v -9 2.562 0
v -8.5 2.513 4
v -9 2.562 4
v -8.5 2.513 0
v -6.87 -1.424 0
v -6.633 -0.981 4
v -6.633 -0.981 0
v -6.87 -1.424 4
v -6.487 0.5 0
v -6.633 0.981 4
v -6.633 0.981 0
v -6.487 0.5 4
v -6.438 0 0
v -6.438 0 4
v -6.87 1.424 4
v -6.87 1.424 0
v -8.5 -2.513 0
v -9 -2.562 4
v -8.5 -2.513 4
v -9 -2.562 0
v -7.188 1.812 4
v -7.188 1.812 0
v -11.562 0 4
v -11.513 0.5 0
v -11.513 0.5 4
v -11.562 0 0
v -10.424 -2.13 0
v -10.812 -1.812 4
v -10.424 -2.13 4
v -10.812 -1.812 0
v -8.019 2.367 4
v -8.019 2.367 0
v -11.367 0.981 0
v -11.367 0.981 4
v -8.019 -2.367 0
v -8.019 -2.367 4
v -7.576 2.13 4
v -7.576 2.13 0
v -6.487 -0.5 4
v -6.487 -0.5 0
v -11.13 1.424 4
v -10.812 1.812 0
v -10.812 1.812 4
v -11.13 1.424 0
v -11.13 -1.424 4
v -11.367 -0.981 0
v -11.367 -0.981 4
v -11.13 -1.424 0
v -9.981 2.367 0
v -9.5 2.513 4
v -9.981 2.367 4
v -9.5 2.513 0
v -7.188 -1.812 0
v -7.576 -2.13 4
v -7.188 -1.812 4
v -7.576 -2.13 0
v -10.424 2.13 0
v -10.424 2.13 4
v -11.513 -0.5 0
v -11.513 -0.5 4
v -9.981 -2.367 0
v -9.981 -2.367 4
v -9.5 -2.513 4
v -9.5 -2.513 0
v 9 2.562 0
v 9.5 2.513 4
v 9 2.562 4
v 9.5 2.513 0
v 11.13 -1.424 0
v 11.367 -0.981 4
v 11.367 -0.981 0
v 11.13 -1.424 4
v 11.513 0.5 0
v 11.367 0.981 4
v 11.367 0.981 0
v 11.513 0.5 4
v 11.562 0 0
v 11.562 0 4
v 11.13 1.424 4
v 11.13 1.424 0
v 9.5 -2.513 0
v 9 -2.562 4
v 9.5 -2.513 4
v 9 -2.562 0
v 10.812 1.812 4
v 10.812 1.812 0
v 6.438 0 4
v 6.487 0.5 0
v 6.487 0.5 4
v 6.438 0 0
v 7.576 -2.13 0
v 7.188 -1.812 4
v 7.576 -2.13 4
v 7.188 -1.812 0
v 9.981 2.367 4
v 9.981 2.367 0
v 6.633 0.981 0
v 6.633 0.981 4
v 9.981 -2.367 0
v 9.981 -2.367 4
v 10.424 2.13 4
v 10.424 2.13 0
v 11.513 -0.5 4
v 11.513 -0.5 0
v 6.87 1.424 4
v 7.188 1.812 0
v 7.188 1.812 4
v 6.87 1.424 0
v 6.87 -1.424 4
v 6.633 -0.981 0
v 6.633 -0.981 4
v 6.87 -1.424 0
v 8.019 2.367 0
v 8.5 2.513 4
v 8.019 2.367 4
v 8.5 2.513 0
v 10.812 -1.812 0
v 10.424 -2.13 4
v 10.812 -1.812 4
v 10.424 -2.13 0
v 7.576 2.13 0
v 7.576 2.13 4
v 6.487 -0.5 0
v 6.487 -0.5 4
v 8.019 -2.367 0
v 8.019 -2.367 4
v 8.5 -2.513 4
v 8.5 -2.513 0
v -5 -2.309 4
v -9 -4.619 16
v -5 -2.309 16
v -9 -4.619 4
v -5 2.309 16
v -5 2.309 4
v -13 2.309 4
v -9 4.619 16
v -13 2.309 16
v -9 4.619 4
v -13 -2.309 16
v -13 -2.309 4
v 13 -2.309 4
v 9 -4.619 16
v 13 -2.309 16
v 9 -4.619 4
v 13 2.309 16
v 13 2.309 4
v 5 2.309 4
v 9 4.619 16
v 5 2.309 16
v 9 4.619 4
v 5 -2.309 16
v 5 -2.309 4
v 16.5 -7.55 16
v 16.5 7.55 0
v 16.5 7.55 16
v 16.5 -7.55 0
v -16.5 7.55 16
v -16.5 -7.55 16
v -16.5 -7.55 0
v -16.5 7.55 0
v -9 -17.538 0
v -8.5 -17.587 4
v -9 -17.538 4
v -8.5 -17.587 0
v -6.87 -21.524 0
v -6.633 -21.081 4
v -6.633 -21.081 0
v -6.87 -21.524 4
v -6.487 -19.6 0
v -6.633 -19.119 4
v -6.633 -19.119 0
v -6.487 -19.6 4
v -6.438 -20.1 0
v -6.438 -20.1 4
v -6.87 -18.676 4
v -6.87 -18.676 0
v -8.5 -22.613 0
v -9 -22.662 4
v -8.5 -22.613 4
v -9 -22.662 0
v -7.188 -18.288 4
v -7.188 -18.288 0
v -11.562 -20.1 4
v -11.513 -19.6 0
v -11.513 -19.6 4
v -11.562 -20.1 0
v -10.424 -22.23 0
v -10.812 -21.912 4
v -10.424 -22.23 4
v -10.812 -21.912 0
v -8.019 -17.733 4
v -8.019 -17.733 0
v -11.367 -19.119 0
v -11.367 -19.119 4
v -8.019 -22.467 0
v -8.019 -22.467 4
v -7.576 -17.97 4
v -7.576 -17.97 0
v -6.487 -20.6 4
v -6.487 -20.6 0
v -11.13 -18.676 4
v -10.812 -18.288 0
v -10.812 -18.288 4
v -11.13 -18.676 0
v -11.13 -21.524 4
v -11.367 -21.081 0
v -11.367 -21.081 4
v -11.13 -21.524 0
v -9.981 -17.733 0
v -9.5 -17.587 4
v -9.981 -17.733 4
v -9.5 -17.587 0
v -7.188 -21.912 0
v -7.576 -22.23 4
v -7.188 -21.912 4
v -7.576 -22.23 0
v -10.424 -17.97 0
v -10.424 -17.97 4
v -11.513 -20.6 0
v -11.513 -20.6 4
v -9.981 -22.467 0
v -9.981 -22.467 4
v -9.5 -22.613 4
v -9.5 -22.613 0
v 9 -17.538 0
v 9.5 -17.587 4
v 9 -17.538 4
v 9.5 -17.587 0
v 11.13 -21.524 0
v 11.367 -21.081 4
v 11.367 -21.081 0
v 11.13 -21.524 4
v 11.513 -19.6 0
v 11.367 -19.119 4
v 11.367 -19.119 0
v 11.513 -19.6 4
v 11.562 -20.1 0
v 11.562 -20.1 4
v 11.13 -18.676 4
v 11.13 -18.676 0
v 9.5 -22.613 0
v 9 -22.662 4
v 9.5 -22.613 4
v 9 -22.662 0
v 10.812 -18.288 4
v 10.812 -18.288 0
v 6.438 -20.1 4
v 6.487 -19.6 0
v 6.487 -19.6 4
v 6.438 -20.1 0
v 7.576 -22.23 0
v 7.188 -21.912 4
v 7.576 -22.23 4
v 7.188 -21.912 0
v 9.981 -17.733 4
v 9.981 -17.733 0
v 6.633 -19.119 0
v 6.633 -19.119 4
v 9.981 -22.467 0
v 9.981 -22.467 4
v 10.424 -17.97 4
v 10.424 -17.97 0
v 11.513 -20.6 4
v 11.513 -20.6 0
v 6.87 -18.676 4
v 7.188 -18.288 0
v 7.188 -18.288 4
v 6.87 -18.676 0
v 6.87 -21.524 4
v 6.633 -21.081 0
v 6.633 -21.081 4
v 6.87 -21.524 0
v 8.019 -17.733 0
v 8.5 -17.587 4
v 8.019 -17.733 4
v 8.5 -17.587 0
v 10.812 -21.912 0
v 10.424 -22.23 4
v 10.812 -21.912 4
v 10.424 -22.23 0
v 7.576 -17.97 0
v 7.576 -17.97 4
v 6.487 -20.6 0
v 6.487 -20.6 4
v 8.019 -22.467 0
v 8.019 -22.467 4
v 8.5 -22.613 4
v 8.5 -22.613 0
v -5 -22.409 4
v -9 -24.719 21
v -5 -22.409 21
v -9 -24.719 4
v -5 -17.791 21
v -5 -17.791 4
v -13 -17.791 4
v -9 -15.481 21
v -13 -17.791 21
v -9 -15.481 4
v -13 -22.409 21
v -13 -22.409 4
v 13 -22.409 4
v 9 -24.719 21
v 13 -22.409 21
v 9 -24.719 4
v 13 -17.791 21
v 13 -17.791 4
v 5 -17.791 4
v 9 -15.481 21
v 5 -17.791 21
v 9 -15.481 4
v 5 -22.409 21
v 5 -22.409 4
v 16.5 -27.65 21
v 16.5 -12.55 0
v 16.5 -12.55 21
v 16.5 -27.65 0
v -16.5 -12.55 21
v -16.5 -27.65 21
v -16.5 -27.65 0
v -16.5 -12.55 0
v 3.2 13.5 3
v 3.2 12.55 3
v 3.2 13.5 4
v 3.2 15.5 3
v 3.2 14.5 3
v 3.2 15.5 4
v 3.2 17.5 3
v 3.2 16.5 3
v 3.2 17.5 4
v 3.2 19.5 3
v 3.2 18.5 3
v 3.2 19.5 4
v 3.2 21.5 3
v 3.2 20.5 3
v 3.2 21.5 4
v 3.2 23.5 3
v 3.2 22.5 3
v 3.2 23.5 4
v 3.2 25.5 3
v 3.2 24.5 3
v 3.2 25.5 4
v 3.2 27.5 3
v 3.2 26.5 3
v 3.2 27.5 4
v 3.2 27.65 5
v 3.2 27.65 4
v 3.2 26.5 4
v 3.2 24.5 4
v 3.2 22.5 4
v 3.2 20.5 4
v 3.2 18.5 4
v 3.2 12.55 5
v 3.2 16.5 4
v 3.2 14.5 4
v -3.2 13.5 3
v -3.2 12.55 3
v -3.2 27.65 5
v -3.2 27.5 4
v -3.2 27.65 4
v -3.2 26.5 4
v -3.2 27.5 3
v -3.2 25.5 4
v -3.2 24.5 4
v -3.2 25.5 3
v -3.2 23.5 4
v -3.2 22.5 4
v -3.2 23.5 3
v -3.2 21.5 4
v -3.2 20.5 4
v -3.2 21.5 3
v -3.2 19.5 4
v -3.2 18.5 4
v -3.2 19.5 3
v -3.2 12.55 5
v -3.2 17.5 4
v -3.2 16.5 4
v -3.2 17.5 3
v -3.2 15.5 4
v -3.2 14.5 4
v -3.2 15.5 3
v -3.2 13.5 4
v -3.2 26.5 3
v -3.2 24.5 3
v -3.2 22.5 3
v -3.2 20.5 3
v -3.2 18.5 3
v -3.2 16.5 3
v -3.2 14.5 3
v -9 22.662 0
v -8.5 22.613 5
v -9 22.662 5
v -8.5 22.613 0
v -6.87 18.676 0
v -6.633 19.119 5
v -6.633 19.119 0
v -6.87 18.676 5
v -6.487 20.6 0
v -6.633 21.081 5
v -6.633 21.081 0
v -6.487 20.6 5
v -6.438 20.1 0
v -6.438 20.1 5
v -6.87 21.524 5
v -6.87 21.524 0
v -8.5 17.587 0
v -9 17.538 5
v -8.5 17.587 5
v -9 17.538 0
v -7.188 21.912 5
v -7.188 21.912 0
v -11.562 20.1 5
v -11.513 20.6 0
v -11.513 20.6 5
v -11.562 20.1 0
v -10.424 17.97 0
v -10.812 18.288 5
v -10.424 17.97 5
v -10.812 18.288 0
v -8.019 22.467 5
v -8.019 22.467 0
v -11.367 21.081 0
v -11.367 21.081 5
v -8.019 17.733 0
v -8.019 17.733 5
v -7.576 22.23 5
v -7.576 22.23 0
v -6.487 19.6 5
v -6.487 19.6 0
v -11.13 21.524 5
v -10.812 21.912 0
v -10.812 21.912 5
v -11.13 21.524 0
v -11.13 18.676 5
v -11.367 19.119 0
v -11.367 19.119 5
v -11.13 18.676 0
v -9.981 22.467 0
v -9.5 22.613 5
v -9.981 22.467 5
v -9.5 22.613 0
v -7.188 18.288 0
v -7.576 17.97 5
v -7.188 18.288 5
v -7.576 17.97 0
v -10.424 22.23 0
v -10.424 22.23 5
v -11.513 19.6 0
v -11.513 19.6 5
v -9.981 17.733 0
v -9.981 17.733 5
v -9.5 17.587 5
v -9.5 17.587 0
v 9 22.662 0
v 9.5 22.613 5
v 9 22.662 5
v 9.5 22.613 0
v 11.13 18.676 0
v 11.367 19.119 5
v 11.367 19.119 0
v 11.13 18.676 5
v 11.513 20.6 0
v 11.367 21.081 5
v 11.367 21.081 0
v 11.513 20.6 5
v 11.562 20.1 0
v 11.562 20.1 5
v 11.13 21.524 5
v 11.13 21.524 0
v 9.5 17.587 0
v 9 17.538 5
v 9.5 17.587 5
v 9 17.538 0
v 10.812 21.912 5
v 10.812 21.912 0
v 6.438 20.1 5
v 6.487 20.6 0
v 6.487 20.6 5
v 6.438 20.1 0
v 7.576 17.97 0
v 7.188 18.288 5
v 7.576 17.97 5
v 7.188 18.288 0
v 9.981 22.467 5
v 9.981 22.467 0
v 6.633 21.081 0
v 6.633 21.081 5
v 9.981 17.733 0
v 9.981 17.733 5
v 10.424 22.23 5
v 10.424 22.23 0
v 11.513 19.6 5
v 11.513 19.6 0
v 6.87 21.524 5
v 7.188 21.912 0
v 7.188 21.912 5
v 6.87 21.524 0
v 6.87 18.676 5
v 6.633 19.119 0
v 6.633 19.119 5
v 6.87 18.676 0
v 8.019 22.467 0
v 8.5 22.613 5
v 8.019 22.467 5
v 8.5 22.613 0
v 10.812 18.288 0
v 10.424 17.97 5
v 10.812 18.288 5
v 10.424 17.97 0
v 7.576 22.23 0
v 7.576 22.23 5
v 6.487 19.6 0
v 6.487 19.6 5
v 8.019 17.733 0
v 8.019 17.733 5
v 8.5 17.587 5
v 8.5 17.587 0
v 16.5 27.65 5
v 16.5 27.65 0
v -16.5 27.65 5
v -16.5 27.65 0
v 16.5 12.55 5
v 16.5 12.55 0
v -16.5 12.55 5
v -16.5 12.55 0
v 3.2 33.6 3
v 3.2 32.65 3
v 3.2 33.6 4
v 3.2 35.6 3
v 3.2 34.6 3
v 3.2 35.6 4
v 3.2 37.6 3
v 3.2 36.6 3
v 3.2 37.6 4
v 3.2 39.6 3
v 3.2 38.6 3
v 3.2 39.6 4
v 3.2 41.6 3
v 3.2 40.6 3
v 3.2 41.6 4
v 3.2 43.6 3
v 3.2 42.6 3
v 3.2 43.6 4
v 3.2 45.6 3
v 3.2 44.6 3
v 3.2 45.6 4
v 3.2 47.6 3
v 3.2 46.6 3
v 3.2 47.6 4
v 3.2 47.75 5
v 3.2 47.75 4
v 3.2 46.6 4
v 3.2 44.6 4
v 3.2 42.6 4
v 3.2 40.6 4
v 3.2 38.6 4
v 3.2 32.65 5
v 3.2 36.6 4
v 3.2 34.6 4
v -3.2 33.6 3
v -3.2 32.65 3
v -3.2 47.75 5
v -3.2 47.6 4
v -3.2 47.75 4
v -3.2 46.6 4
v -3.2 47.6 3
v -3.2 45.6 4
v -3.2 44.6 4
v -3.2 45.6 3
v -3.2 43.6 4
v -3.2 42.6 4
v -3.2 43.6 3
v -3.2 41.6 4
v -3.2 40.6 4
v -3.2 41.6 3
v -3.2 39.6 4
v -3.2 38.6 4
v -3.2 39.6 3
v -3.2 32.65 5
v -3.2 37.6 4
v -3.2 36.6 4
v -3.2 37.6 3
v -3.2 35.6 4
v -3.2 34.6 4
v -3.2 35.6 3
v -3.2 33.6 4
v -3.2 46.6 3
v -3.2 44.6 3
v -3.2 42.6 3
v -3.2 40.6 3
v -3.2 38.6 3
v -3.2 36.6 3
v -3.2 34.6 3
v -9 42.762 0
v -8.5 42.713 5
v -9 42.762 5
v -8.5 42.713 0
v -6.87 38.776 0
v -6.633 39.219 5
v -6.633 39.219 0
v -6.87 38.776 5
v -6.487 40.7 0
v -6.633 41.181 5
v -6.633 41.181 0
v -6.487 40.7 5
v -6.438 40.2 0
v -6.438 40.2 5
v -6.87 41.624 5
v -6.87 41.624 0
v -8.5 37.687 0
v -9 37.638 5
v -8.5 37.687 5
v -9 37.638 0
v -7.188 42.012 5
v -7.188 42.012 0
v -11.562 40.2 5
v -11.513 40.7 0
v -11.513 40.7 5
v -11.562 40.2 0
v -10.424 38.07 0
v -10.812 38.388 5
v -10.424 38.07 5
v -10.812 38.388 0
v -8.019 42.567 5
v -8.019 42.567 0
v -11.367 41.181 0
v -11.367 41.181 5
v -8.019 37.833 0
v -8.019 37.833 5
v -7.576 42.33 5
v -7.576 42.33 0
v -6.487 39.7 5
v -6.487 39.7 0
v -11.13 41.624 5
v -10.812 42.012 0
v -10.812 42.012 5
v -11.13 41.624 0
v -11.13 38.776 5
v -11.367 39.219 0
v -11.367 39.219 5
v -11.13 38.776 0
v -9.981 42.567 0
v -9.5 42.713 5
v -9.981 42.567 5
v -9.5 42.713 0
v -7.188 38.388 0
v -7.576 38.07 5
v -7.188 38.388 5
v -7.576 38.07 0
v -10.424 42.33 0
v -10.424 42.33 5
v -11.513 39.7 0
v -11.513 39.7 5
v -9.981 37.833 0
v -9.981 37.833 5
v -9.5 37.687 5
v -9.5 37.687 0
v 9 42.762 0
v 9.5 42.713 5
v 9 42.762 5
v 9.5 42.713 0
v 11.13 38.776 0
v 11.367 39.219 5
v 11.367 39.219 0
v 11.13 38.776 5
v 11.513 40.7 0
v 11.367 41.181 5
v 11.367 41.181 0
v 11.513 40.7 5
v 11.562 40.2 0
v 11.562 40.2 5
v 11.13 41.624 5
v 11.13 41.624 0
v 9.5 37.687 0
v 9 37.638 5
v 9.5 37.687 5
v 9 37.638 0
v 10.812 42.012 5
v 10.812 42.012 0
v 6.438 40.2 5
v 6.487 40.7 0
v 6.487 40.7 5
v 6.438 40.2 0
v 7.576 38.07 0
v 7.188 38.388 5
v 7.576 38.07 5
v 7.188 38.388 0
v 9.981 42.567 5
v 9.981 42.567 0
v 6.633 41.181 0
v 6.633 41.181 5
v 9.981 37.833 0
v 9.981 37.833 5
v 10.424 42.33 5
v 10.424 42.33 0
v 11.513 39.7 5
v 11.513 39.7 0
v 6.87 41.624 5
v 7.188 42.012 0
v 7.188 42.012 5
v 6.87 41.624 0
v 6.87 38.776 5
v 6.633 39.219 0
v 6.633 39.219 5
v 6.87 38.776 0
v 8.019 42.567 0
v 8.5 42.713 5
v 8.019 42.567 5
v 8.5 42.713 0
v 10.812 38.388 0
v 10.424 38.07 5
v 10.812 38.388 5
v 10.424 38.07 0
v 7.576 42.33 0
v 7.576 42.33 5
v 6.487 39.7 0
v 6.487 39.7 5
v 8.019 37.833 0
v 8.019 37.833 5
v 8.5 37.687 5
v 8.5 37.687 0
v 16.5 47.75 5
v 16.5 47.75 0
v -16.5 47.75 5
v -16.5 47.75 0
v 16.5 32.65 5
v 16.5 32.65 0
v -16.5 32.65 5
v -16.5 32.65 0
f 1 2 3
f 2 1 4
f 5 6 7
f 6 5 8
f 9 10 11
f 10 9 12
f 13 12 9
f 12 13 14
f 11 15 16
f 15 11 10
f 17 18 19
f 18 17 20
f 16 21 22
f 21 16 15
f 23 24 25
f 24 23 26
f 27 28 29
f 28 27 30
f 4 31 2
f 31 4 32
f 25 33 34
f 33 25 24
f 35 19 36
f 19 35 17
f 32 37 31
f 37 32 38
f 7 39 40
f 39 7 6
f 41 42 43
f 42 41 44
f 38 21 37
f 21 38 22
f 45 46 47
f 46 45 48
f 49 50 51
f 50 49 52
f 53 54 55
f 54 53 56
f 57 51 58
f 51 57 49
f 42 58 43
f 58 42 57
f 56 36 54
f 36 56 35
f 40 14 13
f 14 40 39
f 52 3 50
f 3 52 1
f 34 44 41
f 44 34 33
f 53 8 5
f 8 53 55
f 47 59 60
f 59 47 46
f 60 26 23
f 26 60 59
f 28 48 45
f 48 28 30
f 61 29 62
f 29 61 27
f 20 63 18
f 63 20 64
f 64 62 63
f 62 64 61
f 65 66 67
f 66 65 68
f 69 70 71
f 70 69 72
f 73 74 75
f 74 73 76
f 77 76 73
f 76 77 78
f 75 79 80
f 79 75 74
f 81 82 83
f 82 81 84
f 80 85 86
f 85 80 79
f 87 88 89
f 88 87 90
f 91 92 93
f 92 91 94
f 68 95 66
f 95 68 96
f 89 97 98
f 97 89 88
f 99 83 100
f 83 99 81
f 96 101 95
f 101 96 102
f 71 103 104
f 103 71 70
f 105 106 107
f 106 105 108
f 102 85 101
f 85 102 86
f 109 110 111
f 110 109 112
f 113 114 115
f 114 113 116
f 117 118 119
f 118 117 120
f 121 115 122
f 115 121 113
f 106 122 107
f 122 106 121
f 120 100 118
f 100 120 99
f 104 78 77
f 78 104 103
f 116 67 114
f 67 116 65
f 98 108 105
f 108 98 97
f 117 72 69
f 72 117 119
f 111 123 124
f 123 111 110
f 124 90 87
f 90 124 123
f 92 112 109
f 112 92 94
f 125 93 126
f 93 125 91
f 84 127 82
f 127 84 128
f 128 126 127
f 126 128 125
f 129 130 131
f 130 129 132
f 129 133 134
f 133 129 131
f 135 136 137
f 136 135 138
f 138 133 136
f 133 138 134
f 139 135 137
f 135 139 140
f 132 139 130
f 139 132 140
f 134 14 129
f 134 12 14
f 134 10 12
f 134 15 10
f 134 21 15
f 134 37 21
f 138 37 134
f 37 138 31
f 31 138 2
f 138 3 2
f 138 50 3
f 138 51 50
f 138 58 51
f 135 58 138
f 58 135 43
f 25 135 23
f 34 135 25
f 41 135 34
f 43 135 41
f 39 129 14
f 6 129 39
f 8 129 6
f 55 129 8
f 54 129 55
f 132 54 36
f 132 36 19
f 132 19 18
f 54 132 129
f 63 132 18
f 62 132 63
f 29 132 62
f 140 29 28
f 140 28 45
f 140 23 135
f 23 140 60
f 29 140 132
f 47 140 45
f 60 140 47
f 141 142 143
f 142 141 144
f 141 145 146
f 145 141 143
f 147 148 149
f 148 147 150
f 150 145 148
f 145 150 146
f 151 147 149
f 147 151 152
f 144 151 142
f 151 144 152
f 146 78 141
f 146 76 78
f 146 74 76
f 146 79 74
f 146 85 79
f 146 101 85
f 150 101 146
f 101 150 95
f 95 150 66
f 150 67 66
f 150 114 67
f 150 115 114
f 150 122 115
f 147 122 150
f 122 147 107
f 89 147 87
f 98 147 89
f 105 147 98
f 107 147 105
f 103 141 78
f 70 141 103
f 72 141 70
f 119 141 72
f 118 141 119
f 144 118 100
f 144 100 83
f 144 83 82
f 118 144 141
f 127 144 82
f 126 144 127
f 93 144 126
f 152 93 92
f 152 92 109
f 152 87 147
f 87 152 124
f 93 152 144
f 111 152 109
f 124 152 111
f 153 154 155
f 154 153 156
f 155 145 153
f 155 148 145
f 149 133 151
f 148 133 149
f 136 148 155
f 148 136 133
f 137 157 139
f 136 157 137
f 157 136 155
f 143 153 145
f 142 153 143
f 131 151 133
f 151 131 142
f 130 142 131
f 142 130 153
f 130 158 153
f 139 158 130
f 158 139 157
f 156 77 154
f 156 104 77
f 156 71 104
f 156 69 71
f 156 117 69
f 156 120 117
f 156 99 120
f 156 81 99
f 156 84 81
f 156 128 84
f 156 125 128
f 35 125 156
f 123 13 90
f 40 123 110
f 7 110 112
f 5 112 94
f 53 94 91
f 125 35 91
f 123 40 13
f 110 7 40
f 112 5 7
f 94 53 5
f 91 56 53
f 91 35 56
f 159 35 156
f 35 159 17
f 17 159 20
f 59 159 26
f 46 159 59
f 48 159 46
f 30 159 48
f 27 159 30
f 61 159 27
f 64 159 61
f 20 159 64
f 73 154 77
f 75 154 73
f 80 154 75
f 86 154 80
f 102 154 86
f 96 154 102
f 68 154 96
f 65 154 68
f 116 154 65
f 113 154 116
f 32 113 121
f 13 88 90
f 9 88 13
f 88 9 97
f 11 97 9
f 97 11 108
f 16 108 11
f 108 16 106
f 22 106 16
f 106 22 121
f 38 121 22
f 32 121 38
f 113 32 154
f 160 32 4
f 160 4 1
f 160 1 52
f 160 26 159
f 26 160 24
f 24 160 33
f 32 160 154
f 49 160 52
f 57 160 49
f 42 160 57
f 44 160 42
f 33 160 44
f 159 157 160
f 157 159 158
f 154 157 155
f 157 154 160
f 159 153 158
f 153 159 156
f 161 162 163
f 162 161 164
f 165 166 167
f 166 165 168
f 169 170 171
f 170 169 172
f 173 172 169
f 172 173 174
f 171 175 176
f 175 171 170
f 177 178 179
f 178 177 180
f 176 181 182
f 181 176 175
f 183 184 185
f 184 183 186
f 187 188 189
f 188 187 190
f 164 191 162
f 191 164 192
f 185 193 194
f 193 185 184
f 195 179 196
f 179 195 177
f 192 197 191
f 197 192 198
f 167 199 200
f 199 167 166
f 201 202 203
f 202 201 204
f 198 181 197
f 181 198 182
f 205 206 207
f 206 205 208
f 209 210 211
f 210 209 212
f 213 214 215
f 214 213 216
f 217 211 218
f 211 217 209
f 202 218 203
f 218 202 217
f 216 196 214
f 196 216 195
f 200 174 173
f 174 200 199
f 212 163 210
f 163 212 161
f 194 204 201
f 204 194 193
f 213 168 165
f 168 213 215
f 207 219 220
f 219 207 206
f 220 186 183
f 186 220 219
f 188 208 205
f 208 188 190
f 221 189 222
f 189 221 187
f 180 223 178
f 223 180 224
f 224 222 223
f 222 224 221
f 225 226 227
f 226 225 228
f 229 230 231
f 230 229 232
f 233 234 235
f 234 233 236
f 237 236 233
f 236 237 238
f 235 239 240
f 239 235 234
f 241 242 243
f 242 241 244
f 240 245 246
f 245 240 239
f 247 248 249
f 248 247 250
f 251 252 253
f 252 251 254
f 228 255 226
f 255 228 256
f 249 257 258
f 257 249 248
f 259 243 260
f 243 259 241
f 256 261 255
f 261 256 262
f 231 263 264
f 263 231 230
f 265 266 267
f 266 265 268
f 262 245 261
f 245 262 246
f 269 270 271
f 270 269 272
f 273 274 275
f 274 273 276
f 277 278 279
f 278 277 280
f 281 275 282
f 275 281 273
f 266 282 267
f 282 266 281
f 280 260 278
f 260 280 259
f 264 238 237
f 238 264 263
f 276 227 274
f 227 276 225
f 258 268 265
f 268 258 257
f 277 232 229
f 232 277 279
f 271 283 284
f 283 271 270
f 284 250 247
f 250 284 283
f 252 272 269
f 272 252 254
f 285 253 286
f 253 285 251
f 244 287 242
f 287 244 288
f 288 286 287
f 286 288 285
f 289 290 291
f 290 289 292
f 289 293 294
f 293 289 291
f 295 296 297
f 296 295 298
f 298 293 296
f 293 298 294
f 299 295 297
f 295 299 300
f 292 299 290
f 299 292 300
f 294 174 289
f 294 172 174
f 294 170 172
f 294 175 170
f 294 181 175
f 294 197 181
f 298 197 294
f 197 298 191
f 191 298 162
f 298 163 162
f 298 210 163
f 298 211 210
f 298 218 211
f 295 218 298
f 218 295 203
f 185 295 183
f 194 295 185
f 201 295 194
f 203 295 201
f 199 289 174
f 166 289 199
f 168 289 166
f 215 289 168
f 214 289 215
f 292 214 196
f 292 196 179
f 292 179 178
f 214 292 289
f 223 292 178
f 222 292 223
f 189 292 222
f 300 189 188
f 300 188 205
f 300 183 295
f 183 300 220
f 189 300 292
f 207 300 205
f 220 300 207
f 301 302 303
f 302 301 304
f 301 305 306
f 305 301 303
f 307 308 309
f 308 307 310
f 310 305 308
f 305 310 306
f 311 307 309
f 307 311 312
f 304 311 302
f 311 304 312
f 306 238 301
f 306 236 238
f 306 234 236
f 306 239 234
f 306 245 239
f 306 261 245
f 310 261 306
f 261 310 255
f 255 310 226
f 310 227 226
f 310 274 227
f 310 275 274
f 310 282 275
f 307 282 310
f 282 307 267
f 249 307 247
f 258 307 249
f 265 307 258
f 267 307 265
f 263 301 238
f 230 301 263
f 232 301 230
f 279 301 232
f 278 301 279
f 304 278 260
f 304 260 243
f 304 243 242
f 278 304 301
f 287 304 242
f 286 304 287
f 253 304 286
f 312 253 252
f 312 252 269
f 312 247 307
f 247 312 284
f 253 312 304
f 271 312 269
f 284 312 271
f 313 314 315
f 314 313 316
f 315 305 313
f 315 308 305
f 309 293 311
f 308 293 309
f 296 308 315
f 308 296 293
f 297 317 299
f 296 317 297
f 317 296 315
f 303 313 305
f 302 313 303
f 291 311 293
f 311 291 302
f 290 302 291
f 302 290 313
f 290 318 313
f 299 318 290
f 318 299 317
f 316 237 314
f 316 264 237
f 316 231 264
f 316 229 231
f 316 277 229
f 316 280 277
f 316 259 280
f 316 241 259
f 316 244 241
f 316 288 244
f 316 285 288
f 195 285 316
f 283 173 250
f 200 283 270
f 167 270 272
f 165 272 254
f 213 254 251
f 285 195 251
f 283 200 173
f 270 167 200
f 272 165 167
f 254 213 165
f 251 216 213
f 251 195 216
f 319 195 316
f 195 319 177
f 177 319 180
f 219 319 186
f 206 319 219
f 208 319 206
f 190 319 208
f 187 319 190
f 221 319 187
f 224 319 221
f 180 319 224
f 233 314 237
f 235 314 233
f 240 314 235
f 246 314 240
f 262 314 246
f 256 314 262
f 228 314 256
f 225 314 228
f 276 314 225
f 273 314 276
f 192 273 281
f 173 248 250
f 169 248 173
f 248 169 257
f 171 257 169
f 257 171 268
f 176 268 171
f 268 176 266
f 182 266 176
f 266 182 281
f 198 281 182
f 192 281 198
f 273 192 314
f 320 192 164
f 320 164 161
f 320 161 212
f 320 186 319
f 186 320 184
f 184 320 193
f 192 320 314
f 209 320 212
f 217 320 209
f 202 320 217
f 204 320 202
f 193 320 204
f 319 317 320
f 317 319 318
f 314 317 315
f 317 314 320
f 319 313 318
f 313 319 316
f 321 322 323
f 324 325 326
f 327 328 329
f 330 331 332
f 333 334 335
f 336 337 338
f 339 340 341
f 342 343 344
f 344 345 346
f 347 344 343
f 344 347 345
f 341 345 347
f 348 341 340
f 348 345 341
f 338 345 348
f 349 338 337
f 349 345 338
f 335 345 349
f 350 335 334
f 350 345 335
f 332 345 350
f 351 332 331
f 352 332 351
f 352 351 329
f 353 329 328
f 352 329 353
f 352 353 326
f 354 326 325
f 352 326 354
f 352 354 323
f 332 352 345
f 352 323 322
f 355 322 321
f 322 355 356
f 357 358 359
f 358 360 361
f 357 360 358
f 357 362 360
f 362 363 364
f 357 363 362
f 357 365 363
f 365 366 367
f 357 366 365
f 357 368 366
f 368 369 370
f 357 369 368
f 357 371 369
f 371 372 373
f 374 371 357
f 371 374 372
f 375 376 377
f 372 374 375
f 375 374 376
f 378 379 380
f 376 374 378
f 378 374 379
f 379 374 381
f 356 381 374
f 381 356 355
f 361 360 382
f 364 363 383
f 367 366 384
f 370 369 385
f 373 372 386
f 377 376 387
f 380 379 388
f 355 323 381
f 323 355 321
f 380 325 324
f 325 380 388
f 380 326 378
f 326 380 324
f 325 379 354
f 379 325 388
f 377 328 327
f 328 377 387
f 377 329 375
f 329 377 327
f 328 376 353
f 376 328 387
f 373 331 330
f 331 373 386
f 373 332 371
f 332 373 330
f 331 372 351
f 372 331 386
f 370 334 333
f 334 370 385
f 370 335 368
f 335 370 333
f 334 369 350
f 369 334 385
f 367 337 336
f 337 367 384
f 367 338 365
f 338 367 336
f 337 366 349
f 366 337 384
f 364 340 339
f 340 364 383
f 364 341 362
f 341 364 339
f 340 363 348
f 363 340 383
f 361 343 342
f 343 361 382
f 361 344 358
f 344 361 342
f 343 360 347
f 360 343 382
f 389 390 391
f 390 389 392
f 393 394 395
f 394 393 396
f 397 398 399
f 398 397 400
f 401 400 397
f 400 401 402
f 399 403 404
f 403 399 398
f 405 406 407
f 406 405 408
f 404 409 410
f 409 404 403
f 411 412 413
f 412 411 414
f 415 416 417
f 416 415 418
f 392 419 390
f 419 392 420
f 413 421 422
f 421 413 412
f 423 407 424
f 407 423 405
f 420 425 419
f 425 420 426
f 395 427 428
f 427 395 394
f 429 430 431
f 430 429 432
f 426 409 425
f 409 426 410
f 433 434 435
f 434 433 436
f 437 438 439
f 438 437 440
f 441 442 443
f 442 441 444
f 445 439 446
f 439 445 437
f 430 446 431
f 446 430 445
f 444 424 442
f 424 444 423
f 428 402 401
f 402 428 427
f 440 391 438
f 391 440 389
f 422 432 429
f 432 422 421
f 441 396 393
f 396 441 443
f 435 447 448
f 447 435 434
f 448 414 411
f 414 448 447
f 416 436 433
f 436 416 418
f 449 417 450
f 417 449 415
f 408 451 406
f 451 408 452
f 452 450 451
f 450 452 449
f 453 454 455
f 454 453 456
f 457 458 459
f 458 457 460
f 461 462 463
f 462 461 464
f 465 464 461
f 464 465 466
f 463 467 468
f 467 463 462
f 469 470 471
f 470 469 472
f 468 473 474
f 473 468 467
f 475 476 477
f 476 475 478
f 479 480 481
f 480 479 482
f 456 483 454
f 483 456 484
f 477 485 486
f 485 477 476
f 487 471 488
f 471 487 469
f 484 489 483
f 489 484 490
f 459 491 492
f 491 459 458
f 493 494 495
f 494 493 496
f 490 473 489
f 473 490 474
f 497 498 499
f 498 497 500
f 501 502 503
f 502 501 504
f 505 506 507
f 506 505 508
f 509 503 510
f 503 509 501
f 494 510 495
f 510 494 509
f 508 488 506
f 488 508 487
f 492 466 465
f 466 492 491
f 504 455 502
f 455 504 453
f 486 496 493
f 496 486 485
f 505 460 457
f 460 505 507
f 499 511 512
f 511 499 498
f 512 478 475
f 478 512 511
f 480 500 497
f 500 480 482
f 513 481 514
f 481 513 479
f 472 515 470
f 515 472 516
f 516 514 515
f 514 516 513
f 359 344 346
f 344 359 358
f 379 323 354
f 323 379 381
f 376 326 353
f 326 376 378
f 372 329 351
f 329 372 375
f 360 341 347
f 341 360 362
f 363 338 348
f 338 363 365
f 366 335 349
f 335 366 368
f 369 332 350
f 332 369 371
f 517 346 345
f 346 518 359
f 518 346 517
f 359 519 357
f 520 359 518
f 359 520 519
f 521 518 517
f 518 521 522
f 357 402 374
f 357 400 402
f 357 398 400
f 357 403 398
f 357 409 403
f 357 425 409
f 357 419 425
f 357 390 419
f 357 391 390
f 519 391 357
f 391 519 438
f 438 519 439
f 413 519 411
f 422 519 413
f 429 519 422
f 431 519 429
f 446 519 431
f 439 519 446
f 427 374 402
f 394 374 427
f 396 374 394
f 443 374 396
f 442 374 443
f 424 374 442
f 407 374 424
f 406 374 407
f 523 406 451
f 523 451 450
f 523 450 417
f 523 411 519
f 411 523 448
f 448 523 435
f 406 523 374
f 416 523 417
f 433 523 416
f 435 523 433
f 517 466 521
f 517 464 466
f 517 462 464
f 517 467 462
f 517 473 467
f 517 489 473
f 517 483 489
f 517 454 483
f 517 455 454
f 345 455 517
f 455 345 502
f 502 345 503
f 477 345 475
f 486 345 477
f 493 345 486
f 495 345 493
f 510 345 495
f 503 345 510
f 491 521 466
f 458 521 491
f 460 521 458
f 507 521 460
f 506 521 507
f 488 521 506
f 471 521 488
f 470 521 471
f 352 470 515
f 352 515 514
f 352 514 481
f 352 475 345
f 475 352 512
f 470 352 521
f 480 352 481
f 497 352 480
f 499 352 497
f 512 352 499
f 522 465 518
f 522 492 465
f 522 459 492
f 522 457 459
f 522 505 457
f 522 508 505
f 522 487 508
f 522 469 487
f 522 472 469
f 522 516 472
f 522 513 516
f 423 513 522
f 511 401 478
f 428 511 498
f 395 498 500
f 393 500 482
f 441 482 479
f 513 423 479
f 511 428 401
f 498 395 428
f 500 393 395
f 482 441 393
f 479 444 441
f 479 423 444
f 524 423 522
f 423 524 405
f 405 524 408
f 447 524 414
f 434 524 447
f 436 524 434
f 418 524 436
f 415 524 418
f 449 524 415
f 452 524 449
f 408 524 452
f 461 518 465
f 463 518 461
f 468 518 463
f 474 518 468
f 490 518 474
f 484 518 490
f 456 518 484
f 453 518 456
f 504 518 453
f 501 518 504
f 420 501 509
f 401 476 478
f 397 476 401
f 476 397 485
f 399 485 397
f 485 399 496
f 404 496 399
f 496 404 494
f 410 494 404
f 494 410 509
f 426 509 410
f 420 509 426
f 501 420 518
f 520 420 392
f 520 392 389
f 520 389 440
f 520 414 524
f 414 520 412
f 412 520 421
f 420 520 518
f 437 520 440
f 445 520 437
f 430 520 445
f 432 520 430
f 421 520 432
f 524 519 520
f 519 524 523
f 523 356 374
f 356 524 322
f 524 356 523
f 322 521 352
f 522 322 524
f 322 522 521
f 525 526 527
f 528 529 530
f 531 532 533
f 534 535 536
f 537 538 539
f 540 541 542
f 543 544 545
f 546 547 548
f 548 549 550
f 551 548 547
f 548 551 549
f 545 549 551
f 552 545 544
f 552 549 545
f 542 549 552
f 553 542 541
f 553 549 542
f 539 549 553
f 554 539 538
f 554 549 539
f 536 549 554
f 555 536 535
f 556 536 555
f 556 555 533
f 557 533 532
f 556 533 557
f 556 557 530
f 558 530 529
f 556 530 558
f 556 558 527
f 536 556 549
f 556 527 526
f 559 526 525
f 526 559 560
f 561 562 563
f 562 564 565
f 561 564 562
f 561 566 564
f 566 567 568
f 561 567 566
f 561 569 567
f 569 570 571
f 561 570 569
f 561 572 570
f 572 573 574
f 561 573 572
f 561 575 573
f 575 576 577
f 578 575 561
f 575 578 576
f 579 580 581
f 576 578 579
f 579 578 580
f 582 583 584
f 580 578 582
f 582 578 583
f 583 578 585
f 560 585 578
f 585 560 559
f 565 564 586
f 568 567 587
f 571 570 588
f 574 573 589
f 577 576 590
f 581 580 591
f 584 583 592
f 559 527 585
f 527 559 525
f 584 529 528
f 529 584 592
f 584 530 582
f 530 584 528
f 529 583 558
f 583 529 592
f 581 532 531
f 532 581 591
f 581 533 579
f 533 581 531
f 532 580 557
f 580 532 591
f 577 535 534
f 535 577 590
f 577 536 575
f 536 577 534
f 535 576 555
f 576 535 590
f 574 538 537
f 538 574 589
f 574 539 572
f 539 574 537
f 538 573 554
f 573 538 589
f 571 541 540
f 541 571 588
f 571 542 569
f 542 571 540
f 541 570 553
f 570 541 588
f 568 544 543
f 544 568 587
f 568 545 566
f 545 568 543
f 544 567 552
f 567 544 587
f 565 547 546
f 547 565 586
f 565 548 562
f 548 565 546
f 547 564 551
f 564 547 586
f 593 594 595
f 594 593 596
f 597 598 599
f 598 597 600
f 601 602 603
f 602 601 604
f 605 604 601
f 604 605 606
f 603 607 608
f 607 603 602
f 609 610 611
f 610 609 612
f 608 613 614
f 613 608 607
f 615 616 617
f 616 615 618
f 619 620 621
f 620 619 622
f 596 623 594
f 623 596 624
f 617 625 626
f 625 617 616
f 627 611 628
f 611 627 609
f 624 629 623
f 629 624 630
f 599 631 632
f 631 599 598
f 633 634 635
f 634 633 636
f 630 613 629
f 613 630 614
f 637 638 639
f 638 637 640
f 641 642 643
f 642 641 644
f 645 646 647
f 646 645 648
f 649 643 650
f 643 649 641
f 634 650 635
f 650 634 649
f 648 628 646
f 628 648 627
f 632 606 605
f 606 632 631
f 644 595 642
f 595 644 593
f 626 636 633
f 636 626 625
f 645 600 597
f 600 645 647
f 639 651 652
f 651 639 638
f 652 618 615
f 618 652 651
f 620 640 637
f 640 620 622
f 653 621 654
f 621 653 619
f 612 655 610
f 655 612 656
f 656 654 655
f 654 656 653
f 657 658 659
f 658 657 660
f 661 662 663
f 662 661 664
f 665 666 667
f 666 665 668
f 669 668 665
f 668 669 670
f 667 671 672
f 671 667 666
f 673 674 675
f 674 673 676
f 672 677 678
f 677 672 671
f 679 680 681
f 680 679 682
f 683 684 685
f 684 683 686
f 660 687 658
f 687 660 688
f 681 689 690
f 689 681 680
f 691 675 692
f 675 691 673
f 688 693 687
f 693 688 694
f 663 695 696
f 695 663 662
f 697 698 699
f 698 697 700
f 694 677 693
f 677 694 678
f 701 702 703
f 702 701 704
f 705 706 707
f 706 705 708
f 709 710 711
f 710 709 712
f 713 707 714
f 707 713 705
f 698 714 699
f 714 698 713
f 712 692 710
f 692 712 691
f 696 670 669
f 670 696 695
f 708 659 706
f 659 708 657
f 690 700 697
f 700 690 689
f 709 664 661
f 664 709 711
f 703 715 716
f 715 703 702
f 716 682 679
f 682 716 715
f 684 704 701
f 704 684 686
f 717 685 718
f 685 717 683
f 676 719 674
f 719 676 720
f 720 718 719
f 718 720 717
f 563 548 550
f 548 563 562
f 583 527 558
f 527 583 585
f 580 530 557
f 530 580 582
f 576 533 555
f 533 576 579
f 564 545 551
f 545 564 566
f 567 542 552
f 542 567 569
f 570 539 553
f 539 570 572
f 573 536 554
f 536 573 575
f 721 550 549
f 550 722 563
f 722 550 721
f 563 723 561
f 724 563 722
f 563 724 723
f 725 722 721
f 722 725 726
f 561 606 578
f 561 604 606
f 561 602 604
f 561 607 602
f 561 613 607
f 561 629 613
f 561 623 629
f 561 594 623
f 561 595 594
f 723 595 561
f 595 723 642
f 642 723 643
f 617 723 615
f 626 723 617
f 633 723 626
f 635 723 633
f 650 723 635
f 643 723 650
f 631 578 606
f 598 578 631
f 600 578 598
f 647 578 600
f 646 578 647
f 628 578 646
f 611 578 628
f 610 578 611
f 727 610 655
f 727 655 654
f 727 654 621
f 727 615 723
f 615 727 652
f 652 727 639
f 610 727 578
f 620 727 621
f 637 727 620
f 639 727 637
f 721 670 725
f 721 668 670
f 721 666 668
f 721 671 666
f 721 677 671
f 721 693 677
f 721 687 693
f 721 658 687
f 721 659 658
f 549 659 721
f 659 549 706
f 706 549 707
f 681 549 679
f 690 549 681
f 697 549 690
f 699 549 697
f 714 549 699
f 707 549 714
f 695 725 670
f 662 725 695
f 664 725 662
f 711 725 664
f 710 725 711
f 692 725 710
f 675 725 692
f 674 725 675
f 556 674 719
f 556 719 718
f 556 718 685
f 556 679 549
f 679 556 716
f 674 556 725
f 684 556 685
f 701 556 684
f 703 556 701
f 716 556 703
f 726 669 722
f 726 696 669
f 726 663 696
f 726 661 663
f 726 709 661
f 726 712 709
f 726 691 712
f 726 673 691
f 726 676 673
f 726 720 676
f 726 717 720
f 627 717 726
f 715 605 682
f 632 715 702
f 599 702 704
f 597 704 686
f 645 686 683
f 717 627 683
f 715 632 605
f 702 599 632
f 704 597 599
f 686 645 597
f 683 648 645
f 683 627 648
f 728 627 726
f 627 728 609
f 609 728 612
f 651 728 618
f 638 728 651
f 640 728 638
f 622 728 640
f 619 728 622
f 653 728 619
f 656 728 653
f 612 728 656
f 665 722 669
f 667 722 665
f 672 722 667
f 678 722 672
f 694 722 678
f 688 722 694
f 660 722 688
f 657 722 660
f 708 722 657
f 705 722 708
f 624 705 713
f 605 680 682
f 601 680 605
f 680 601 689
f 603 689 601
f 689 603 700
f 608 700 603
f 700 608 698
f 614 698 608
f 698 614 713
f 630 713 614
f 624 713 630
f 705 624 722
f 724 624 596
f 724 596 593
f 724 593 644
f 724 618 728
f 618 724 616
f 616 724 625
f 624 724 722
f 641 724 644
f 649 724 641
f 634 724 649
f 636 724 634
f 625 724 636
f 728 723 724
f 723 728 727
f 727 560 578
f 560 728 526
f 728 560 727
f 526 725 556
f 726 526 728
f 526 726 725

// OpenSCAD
// file: includes/adjustments.scad
//these two are needed otherwise you need to put them in
//if you forget it'll complain about unknown variables.
$fn=32;
center=false;

module nut()
{
cylinder(d=(2*(tan(30)*nut_size)),h=nut_h, center=center, $fn=6); // don't do anything here
    //echo ("point to point:"); // this just echoes
    //echo ((tan(30)*nut_size)*2); //the diameter of a circle that will encompass the exterior of the hexagonal shape.
}

module hole()
{ 

    //hole = size of the hole
    //h = height
    cylinder(d=(hole_dia+(hole_dia-(cos(360 / (2*$fn)) * hole_dia) )),h=h,center=center,$fn=$fn); 
    //echo ("real hole diameter");
    //echo ((hole_dia+(hole_dia-(cos(360 / (2*$fn)) * hole_dia) )));
}
// main file
/* 
Bed to bolt motor end: 21
Bed to bolt idler end: 16

Note: Belt is a tiny bit loose (or at least mine is) with current settings which is good
and allows for some wiggle room so it self centers. Nothing worse than a belt clamped in
crooked making it want to wander around.

Not loose enough to pull out or affect tensioning though.
*/

include <includes/adjustments.scad>


hole_width = 18; //stupid name for how far apart the holes are
mount_bolt_dia = 5.1; //usually hole() will take care of clearance but for some reason it's a bit tight with 5.0mm so 5.1 for clearance.
nut_size = 8; //how big are your nuts, nut() will take care of the clearance so just measure them with calipers.
belt_pitch = 2; //distance between the teeth
belt_width = 6.4; //how wide the belt
belt_tooth = 1; //how thick the teeth are

module spacer(){
    difference(){
        //cube spacer
        translate([0,0,bed_to_belt/2])cube([hole_width+15,mount_bolt_dia+10,bed_to_belt],center=true);
        union(){
            //bolts
            translate([-hole_width/2,0,bed_to_belt/2])hole(hole_dia=mount_bolt_dia,h=bed_to_belt+1,center=true,$fn=32);
            translate([hole_width/2,0,bed_to_belt/2])hole(hole_dia=mount_bolt_dia,h=bed_to_belt+1,center=true,$fn=32);
            //nuts
            translate([-hole_width/2,0,4])rotate([0,0,30])nut(hole_dia=nut_size,nut_h=bed_to_belt,center=false,$fn=32);
            translate([hole_width/2,0,4])rotate([0,0,30])nut(hole_dia=nut_size,nut_h=bed_to_belt,center=false,$fn=32);
        }
    }
}
module clamp(){
        difference(){
        //cube clamp
        translate([0,0,0])cube([hole_width+15,mount_bolt_dia+10,5],center=true);
        union(){
            //bolts
            translate([-hole_width/2,0,0])hole(hole_dia=mount_bolt_dia,h=6,center=true,$fn=32);
            translate([hole_width/2,0,0])hole(hole_dia=mount_bolt_dia,h=6,center=true,$fn=32);
            //belt teeth grips
            for (i = [-mount_bolt_dia-belt_pitch:belt_pitch:mount_bolt_dia+belt_pitch]){
                translate([0,i,1.5])cube([belt_width,belt_tooth,2],center=true);
                
            }
            translate([0,0,2.5])cube([belt_width,mount_bolt_dia+10,2],center=true);
        }
    }
}

spacer(bed_to_belt = 16); //idler end
translate([0,-mount_bolt_dia-15,0])spacer(bed_to_belt = 21); //motor end
translate([0,mount_bolt_dia+15,2.5])clamp();
translate([0,(mount_bolt_dia+15)*2,2.5])clamp();
